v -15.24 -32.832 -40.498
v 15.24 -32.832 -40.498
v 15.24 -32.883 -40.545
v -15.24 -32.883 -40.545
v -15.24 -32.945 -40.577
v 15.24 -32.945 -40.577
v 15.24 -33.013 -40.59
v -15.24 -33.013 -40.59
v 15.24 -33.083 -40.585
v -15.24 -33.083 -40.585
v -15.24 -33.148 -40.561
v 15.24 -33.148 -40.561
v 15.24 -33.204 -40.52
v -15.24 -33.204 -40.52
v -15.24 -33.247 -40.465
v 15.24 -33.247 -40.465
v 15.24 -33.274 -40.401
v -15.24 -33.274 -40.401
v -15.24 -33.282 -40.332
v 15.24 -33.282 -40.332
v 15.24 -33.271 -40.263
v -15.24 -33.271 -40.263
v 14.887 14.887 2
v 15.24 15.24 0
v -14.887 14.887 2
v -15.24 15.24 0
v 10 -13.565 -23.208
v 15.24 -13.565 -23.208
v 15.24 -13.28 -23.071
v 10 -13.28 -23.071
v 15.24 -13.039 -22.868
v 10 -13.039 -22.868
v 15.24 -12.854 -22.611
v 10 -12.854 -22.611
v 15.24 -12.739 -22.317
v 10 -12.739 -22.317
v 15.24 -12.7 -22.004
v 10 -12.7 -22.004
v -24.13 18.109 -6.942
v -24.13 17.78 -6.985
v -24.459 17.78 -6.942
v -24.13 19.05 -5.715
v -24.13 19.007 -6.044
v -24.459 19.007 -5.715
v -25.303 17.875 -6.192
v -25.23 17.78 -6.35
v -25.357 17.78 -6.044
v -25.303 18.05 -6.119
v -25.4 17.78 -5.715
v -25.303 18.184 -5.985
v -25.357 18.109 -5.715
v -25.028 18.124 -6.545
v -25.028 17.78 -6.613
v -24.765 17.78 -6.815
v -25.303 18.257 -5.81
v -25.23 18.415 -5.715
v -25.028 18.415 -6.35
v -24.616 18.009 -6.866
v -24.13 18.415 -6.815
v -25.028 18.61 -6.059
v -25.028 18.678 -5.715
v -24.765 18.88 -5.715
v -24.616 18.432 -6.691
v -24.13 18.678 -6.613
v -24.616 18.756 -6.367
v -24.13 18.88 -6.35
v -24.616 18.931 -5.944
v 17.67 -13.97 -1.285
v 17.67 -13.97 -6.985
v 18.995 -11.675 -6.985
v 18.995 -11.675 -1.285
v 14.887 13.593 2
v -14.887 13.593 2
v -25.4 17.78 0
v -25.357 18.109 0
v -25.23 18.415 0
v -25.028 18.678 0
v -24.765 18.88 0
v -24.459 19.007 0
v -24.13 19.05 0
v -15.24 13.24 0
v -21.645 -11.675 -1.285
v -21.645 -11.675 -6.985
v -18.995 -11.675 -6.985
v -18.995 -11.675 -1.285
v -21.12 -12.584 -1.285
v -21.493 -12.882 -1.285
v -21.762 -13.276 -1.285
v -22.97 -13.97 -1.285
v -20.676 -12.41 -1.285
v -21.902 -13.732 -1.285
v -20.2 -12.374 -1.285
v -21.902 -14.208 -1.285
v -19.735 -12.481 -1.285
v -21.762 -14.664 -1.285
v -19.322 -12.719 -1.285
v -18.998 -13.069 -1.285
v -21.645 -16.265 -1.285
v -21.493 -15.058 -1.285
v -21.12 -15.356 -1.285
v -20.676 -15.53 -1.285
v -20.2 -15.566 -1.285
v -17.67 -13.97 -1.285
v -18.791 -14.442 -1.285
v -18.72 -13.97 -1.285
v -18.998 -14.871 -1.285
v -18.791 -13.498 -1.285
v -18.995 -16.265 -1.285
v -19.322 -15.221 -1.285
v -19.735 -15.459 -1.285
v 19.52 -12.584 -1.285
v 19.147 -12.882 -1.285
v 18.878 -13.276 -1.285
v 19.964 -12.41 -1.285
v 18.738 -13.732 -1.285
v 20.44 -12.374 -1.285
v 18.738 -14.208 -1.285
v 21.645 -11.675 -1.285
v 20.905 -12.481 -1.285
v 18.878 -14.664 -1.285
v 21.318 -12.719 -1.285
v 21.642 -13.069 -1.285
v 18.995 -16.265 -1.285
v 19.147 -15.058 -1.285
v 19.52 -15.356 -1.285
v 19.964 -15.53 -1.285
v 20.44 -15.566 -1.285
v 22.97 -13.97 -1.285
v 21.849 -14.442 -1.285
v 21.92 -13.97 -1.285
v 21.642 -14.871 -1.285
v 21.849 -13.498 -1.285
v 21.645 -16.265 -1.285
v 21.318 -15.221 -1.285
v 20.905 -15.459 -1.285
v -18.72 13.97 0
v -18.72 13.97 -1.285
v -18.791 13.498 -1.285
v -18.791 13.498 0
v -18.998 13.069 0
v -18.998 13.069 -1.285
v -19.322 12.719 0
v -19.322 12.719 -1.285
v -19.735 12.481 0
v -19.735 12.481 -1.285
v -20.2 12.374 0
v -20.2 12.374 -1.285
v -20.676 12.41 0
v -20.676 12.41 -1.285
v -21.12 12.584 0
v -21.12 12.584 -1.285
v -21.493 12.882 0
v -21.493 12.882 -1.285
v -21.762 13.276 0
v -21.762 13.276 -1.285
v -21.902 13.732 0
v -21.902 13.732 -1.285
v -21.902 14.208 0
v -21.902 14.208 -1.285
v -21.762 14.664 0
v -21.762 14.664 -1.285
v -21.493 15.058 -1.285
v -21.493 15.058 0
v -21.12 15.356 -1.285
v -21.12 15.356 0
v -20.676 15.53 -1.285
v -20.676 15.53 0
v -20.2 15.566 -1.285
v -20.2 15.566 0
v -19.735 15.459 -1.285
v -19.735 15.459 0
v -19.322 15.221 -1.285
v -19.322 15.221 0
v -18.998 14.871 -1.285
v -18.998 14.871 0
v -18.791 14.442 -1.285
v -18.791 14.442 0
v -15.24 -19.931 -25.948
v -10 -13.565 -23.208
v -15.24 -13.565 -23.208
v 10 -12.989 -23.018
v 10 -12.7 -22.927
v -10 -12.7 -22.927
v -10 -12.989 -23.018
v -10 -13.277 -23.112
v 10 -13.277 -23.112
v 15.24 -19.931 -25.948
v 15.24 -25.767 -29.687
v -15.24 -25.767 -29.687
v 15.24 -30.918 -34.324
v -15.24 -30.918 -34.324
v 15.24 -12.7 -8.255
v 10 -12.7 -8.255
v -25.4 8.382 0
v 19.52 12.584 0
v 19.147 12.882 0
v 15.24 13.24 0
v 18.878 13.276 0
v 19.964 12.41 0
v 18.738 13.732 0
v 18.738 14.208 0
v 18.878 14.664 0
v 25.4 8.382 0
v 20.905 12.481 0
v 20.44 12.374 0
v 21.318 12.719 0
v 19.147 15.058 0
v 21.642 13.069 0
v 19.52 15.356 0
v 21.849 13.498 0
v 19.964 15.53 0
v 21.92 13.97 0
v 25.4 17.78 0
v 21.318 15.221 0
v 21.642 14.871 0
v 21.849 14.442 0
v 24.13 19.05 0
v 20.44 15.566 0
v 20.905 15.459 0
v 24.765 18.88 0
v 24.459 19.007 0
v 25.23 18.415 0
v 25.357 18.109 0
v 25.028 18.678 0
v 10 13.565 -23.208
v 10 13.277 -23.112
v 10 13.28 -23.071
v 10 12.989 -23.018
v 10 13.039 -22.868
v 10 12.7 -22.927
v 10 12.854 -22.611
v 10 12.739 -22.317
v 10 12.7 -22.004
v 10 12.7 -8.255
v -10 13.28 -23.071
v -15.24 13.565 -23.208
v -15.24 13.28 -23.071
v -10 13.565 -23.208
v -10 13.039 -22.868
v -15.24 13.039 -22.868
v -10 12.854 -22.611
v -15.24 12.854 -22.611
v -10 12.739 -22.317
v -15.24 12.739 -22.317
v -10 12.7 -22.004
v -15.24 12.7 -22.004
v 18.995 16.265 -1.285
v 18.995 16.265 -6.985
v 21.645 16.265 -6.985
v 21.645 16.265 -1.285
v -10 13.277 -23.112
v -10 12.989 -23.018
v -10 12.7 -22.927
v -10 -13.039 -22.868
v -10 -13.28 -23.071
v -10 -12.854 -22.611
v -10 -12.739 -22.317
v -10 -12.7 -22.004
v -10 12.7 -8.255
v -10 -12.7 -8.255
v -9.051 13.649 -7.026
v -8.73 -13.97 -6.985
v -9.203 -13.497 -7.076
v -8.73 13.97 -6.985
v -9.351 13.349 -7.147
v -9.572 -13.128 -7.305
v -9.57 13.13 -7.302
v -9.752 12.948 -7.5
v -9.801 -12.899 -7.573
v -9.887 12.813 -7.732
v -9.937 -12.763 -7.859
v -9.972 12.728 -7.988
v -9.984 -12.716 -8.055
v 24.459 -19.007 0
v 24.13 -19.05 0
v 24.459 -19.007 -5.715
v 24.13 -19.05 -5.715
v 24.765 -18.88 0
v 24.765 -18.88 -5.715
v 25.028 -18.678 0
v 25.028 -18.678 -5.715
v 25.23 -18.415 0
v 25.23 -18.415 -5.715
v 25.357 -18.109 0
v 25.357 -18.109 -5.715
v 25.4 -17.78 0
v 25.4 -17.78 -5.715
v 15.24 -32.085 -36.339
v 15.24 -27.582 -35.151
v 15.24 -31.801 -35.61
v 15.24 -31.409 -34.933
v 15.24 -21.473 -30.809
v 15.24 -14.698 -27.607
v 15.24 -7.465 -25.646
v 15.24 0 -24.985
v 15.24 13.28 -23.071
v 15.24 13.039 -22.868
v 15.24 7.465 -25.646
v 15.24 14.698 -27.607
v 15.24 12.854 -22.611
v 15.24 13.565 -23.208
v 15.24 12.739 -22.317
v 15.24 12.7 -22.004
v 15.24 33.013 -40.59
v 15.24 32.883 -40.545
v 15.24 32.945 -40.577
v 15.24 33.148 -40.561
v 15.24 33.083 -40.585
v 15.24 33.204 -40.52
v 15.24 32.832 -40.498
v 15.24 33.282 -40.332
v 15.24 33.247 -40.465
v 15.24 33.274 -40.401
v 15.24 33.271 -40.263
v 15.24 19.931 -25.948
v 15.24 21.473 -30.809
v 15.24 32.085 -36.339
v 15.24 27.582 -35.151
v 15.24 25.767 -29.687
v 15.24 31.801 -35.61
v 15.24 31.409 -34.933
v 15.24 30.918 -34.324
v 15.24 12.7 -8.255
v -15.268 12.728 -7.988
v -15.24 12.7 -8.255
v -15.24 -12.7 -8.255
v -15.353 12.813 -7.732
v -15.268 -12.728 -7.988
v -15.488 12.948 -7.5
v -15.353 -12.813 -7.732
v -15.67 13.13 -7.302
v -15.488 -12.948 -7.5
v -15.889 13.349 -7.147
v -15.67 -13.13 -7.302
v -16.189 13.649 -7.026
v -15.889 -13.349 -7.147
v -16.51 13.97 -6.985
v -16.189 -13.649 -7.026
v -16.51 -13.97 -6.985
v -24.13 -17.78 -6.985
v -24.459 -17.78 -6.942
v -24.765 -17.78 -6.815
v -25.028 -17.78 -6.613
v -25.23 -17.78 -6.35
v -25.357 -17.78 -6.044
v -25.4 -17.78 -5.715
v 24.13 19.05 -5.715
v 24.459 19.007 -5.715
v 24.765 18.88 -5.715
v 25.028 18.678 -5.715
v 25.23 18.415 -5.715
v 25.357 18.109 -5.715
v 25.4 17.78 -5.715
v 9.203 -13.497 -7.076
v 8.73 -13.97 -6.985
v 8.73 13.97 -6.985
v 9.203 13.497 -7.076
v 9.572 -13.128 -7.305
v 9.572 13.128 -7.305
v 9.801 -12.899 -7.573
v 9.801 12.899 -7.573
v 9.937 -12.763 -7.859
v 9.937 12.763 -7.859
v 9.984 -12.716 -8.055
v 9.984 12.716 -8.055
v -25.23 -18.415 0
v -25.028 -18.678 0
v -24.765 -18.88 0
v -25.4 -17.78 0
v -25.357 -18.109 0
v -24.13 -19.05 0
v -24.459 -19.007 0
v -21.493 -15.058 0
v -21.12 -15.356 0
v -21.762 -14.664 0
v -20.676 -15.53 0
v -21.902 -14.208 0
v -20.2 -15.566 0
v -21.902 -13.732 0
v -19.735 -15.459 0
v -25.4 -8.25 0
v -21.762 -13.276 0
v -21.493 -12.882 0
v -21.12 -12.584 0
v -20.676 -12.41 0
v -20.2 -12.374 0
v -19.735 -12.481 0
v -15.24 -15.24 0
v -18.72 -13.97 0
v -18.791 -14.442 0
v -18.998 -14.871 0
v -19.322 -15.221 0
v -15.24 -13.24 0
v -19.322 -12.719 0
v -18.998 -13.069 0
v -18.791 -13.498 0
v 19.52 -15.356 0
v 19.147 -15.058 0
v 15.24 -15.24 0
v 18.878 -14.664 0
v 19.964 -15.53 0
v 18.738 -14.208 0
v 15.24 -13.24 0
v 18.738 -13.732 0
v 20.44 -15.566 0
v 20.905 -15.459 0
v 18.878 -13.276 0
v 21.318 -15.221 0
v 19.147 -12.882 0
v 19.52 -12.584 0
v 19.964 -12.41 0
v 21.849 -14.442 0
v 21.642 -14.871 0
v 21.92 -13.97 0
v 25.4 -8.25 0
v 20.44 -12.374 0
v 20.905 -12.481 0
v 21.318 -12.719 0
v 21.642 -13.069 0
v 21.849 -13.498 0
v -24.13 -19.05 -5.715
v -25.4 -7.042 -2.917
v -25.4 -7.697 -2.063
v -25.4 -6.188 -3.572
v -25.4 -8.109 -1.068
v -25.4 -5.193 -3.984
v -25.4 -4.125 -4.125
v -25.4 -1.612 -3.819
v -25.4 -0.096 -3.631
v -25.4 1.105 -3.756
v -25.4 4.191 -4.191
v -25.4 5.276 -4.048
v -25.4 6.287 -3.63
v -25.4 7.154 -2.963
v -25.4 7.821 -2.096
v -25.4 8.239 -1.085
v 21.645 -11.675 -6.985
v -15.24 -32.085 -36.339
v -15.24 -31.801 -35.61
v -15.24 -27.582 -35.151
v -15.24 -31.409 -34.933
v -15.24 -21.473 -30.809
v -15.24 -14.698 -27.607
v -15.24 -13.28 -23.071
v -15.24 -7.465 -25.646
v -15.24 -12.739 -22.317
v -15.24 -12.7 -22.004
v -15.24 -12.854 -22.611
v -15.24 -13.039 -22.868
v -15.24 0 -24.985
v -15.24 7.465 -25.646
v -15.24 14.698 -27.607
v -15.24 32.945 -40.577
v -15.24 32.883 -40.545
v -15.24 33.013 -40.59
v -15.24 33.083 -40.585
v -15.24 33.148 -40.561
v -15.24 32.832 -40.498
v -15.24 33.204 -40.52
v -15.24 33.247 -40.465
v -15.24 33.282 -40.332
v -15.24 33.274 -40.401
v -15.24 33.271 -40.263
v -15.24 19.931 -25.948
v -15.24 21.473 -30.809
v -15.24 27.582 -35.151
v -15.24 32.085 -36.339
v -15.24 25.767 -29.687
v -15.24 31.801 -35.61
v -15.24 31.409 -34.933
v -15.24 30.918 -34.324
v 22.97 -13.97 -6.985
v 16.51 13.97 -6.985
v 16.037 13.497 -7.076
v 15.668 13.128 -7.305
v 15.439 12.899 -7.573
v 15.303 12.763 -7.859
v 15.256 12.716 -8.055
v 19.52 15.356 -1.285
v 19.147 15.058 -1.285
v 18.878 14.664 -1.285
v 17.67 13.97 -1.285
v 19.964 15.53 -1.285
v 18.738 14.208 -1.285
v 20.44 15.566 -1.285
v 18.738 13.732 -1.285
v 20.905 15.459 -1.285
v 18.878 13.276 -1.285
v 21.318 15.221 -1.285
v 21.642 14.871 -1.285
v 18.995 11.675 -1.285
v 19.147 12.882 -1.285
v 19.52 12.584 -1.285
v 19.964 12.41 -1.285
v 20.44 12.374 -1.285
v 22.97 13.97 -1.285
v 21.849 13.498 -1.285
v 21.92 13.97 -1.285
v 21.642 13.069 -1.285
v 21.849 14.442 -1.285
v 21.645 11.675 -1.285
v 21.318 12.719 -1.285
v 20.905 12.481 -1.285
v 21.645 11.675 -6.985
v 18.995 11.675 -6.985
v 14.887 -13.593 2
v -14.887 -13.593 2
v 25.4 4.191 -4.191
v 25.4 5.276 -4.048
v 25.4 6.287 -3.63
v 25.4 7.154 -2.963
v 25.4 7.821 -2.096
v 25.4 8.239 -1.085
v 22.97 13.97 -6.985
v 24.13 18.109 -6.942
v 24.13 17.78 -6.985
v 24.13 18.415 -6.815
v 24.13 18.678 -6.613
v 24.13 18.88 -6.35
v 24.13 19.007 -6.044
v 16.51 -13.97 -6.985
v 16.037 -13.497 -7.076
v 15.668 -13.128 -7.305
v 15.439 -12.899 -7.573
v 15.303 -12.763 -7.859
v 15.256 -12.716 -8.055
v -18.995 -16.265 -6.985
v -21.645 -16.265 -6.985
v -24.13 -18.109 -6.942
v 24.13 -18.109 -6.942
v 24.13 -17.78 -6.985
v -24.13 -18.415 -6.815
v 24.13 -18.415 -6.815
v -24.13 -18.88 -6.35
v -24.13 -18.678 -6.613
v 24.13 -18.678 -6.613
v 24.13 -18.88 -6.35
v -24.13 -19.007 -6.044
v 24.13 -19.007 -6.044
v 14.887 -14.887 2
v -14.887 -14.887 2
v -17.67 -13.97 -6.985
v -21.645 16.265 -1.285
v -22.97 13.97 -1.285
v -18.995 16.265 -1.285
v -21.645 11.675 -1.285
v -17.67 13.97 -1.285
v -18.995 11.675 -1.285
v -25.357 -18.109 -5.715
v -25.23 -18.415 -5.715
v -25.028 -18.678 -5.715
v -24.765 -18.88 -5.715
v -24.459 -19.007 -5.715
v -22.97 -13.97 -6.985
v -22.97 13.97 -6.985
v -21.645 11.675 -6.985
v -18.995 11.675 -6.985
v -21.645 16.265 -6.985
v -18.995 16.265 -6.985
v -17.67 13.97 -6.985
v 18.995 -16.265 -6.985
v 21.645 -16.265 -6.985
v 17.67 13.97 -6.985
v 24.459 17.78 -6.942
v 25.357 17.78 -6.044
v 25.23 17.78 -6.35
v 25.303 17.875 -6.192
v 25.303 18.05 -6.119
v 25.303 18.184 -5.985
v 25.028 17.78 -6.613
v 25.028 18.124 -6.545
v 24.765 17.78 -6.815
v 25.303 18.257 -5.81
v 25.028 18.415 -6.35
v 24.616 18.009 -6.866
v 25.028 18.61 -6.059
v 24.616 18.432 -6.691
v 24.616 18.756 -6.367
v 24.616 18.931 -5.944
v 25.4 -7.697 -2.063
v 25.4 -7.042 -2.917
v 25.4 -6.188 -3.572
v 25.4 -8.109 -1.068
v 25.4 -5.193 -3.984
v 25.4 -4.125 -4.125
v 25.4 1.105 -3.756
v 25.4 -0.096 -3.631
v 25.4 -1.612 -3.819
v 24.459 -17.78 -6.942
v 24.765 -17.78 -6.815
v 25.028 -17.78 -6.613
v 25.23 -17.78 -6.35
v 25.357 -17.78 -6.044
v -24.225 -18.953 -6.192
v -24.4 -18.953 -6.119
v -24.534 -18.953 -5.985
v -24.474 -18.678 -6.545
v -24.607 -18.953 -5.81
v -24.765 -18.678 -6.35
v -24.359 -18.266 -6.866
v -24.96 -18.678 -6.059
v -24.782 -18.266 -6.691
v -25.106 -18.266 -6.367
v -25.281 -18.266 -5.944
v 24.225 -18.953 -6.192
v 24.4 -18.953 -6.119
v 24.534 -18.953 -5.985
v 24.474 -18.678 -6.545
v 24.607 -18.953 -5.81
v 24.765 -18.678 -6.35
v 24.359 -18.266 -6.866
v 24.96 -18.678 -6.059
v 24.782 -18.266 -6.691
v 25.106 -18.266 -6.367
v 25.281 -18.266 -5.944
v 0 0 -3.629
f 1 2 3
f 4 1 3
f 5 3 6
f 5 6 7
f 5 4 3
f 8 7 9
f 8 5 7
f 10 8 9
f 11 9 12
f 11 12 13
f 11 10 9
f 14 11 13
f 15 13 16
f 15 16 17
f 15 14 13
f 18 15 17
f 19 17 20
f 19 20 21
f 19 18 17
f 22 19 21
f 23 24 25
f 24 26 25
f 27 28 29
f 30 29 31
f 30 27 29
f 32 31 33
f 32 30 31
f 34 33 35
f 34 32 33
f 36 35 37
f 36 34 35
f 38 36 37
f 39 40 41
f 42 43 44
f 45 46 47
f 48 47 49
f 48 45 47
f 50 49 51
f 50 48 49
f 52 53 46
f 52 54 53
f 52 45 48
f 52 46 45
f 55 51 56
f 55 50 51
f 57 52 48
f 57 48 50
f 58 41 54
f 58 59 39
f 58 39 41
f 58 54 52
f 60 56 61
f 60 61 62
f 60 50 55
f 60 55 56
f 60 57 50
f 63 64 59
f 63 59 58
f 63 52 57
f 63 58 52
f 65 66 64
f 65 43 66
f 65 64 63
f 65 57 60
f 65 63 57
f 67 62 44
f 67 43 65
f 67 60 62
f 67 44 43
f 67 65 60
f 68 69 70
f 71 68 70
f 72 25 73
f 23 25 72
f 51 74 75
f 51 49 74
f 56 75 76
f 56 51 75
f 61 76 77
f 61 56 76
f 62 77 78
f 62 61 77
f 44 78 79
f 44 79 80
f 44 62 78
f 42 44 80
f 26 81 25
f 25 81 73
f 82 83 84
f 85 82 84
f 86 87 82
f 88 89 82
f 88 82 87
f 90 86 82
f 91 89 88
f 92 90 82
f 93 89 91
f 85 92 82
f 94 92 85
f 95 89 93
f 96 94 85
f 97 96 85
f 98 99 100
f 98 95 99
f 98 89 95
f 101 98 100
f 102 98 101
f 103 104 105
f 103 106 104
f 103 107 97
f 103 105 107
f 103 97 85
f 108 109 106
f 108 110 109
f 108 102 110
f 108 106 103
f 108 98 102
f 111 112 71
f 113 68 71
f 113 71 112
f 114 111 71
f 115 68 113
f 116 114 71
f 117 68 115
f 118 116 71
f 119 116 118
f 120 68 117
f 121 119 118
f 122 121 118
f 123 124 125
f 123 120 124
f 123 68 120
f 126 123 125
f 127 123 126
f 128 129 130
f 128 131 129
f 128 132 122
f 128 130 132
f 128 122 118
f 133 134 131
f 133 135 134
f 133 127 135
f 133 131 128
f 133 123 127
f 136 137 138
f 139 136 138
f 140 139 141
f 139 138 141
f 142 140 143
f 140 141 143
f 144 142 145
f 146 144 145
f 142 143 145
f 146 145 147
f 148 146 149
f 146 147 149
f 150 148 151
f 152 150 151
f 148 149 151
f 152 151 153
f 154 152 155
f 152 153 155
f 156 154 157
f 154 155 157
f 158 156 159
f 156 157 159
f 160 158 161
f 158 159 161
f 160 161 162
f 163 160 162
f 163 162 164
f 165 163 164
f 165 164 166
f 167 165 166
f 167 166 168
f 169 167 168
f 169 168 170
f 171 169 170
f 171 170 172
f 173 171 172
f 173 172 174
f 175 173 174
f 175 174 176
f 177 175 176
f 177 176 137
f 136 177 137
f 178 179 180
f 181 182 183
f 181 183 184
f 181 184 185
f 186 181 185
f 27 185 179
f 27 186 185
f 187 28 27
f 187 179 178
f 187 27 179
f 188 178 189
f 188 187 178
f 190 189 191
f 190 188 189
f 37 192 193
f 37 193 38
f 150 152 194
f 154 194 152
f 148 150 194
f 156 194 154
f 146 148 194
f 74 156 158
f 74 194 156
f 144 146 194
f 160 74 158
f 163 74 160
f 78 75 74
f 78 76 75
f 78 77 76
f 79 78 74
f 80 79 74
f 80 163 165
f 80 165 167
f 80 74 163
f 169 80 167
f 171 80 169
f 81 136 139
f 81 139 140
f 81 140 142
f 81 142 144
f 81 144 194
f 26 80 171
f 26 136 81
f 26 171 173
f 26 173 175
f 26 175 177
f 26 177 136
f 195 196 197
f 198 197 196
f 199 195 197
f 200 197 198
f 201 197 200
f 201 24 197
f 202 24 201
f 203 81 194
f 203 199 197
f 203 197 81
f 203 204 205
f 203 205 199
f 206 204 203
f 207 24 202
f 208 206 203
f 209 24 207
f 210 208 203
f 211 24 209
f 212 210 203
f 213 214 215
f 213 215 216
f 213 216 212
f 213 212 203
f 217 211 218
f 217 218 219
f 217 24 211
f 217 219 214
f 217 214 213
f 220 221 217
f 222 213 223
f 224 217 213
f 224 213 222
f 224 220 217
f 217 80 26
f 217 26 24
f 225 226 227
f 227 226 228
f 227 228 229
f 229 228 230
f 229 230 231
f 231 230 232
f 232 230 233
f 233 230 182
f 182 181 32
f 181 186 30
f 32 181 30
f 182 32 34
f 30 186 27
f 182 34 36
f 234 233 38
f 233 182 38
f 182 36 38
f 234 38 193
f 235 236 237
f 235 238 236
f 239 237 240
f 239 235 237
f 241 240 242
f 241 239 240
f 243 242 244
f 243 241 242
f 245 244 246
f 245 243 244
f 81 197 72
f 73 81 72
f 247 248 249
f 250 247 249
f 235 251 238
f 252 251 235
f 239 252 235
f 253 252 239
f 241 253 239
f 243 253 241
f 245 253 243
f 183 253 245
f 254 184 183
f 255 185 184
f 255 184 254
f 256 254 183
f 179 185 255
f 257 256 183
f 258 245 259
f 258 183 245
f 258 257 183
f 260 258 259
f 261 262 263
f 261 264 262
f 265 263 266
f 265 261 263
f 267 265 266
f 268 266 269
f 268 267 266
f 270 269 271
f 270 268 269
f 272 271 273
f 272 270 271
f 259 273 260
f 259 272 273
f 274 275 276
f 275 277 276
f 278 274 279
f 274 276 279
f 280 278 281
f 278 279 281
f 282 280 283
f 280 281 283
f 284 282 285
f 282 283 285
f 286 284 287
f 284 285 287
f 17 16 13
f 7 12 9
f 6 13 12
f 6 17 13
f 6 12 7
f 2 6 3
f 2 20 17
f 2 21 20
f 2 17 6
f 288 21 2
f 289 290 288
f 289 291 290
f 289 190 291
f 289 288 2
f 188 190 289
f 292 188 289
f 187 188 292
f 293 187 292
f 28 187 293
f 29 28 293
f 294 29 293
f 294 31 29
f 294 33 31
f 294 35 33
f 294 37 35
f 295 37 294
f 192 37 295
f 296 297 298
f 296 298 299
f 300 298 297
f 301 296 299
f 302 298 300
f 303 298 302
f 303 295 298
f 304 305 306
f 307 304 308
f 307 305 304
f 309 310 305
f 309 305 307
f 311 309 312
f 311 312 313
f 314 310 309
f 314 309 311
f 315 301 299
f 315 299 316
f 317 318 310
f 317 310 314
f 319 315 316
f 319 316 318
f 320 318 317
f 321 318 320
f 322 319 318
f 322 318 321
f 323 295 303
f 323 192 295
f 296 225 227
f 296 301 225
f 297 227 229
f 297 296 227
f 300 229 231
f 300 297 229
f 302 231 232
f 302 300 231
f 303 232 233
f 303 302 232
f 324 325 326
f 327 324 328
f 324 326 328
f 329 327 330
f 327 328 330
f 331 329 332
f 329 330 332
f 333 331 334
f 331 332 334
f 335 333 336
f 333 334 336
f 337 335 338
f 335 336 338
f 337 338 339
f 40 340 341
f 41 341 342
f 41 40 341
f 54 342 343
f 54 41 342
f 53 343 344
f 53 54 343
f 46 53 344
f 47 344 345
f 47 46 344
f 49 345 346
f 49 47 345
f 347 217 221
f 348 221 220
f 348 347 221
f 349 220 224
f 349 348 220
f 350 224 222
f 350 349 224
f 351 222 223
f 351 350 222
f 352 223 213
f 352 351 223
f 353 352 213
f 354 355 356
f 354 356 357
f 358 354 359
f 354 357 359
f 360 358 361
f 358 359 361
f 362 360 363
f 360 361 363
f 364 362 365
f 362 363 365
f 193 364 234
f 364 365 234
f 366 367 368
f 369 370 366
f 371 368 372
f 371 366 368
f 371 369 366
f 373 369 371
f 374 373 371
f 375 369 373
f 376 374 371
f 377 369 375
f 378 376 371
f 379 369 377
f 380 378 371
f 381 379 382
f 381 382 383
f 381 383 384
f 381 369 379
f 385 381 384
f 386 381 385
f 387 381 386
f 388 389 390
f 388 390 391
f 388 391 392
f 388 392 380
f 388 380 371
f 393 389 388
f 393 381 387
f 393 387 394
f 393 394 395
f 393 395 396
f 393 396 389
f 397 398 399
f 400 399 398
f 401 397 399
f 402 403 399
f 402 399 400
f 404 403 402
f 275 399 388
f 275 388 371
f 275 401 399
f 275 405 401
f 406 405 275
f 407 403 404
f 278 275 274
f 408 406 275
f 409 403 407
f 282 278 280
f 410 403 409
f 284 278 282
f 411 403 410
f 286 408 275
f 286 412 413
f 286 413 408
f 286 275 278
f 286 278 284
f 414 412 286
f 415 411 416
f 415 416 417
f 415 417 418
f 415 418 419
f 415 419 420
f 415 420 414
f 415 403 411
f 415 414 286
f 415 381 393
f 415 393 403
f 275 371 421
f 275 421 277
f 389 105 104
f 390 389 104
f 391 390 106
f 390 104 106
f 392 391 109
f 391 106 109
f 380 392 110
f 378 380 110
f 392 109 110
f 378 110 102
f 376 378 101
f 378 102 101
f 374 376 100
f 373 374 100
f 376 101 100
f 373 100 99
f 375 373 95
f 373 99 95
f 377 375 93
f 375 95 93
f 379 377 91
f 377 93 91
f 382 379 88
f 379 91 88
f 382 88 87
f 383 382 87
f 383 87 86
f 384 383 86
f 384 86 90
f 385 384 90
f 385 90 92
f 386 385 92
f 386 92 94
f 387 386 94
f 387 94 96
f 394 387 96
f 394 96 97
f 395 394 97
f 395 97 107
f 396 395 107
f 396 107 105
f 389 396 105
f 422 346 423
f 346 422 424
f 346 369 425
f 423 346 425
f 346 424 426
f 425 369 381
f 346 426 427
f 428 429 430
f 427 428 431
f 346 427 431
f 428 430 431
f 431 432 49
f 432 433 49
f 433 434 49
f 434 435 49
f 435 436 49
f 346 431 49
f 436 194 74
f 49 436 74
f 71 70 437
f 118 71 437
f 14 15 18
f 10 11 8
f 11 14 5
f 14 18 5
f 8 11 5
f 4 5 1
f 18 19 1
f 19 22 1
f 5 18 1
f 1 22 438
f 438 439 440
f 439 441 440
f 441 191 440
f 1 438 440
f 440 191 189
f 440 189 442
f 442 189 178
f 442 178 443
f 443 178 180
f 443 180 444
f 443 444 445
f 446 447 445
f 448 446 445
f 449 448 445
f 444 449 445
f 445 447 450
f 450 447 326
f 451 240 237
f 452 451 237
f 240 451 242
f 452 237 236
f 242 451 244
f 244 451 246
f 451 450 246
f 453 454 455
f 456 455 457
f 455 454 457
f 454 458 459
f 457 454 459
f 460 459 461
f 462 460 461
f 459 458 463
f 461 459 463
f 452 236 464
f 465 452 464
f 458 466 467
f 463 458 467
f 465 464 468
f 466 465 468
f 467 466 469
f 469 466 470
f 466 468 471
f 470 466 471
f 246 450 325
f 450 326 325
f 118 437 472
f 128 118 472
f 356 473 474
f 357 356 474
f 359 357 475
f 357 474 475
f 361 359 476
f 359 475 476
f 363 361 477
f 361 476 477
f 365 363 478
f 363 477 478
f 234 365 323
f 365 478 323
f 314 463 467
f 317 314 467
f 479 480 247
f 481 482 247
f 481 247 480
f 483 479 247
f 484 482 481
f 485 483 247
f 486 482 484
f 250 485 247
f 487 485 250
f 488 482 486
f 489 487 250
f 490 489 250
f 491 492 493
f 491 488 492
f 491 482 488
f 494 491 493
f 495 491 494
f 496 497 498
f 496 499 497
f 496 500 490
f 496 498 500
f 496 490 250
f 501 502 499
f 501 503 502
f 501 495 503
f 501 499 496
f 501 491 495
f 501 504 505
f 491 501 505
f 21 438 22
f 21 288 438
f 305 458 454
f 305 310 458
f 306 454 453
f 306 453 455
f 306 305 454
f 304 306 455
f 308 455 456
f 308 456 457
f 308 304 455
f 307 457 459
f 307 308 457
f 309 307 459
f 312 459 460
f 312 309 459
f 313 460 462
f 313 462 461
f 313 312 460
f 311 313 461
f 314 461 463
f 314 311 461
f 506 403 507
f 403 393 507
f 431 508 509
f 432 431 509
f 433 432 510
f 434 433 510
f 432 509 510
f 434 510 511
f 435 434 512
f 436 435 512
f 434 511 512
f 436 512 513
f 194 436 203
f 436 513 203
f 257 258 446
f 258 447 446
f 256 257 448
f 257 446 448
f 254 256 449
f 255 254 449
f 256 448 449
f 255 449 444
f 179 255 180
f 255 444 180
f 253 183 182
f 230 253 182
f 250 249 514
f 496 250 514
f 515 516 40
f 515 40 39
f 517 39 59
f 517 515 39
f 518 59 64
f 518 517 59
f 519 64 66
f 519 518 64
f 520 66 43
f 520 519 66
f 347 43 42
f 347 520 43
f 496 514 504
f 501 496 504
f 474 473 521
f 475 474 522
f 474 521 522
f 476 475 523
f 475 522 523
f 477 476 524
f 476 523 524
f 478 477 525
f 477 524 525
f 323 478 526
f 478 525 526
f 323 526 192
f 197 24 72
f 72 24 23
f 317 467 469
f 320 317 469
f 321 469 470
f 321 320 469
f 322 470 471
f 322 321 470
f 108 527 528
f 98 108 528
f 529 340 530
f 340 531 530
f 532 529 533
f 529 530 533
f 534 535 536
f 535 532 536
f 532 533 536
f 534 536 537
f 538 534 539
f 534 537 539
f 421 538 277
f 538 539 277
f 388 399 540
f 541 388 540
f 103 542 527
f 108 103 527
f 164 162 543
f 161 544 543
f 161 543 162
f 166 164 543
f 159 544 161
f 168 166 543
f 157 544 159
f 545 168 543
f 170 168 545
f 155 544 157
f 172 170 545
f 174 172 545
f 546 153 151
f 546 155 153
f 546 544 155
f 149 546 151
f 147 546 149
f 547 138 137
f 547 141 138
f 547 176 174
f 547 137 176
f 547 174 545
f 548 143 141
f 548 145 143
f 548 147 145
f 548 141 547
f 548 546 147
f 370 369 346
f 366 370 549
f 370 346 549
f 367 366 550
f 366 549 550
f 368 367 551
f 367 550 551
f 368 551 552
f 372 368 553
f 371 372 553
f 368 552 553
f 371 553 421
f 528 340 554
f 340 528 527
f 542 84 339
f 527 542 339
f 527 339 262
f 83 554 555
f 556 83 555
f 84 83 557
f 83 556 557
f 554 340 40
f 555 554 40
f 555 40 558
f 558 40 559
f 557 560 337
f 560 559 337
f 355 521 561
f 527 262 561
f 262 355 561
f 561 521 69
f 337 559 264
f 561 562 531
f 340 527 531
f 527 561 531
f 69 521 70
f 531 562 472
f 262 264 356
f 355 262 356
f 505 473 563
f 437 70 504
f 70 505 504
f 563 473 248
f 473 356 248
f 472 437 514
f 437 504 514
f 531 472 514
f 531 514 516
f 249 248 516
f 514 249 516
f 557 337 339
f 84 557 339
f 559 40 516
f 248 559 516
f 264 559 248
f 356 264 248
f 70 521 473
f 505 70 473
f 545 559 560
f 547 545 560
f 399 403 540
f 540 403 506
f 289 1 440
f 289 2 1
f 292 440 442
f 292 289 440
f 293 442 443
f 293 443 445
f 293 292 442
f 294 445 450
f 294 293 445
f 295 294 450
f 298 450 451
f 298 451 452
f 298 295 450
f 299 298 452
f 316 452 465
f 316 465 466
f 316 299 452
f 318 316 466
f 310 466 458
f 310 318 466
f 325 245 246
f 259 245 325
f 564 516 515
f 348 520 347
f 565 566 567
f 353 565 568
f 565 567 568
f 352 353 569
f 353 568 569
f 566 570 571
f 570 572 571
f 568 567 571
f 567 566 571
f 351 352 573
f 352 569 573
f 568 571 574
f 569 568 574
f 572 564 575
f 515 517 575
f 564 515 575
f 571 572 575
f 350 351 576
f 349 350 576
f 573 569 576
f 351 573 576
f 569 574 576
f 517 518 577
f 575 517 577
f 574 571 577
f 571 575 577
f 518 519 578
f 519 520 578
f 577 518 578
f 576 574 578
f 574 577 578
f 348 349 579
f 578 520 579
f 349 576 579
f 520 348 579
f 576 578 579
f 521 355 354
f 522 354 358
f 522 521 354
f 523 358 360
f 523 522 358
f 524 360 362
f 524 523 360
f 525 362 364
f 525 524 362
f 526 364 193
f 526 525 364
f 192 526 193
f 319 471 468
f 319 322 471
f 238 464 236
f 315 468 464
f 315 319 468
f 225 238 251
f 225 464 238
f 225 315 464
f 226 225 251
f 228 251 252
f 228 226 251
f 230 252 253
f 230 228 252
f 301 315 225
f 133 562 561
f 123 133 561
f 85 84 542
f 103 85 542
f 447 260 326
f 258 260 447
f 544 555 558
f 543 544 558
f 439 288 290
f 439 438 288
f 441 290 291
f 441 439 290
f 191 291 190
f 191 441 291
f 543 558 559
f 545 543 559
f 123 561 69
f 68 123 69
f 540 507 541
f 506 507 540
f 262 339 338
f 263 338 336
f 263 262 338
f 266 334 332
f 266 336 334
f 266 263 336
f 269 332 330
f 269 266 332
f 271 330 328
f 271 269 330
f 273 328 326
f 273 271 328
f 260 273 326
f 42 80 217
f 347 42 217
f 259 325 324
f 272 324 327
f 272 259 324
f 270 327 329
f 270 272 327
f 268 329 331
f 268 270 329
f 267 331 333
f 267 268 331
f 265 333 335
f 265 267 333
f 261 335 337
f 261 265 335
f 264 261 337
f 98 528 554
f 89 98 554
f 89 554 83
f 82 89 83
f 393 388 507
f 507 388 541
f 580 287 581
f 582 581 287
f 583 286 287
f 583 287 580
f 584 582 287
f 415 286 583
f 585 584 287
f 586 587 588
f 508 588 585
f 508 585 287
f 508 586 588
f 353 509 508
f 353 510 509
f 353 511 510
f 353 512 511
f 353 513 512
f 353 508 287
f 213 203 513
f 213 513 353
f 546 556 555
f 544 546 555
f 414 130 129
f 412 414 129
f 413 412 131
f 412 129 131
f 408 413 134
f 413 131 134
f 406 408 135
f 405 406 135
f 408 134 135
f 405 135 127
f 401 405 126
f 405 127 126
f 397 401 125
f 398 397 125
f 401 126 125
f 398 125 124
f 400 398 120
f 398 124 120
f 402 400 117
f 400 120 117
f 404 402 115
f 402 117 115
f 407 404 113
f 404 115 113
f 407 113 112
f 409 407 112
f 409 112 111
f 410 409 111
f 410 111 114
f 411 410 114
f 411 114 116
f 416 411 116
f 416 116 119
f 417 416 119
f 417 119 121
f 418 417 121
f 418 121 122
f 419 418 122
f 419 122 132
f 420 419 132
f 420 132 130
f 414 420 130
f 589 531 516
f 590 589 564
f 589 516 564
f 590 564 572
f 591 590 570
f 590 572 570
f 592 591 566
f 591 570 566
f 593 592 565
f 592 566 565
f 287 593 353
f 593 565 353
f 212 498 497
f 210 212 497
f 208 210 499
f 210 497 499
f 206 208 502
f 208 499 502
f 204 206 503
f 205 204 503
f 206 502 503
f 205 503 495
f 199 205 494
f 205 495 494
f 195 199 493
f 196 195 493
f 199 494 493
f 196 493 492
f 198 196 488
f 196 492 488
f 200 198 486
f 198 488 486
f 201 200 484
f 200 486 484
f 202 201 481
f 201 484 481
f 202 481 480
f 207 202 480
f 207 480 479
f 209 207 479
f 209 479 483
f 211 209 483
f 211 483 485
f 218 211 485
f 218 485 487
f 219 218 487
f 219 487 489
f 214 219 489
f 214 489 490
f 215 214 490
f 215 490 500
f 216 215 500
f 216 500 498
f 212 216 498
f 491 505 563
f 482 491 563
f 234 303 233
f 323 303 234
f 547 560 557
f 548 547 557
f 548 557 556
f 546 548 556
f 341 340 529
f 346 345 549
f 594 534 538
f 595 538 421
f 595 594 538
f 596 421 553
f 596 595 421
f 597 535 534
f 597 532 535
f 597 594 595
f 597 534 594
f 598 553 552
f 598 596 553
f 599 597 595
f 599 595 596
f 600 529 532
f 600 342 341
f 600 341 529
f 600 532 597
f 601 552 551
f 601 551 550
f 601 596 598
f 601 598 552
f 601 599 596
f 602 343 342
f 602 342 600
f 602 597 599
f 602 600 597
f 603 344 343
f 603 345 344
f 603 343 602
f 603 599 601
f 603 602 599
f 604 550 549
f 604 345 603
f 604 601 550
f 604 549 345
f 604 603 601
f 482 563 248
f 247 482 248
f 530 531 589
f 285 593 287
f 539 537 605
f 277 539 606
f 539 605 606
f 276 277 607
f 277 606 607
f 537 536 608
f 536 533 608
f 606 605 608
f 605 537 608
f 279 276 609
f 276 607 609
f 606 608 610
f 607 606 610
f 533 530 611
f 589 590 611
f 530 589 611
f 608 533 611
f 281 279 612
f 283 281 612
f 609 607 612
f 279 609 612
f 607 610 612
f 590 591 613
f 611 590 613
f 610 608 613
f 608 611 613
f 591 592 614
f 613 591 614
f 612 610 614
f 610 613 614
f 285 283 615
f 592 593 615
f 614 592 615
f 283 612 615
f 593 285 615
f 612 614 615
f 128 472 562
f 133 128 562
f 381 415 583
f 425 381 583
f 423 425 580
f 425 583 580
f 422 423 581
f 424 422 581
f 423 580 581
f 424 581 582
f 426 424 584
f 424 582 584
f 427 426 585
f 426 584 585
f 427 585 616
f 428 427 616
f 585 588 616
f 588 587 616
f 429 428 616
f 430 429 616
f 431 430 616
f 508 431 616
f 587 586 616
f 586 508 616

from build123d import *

# Parameters (mm, degrees)
F1_W          = 50.8
F1_H          = 38.1
F2_DEPTH      = 6.985
F4_DEPTH      = 50.8
F6_DEPTH      = 15.24
F6_DEPTH_BACK = 15.24
F7_W          = 20
F7_H          = 15.9418935353
F8_DEPTH      = 25.4
F9_R          = 1.6
F10_DEPTH     = 25.4
F11_R         = 1.6
F12_DEPTH     = 5.7
F13_W         = 30.48
F13_H         = 2
F14_DEPTH     = 2
F14_TAPER     = 10
F15_F1_R      = 0.254
F15_F2_R      = 0.254
F16_R         = 5.08
F17_R         = 1.27


# Not quite as in the source:
# - two fillets or chamfers of one size are made in one step


with BuildPart() as f2:
    # F1 (on Top) → F2 (new body)
    with BuildSketch(Plane.XY):
        Rectangle(F1_W, F1_H)
    extrude(amount=-F2_DEPTH)

    # F3 (on face) → F4 (cut, through all)
    with BuildSketch(Plane.YZ.offset(25.4)):
        with BuildLine():
            add(Edge.make_bspline(
                [(-4.125, 4.125), (-2.4255892558, 4.1137489608), (-0.0276085061, 2.971292738), (2.5249406681, 4.1137612248), (4.191, 4.191)],
                knots=[0, 0, 0, 0, 0.4977710734, 1, 1, 1, 1], degree=3))
            ThreePointArc((-4.125, 4.125), (-7.0418154724, 2.9168154724), (-8.25, 0))
            ThreePointArc((-8.25, 0), (-7.0418154724, -2.9168154724), (-4.125, -4.125))
            add(Edge.make_bspline(
                [(-4.125, -4.125), (-2.9335741419, -4.2006121948), (0.4172014685, -3.0581585459), (2.1438994445, -4.2006121948), (4.191, -4.191)],
                knots=[0, 0, 0, 0, 0.497799261, 1, 1, 1, 1], degree=3))
            ThreePointArc((4.191, -4.191), (7.15448452, -2.96348452), (8.382, 0))
            ThreePointArc((8.382, 0), (7.15448452, 2.96348452), (4.191, 4.191))
        make_face()
    extrude(amount=-F4_DEPTH, mode=Mode.SUBTRACT)

    # F5 (on Right) → F6 (join, two sides)
    with BuildSketch(Plane.YZ) as f6_sk:
        with BuildLine():
            ThreePointArc((-33.655, -41.5313687512), (0, -24.985), (33.655, -41.5313687512))
            Line((33.655, -41.5313687512), (31.75, -35.2327876972))
            ThreePointArc((31.75, -35.2327876972), (23.0609926669, -27.7856916423), (12.7, -22.9268935353))
            ThreePointArc((12.7, -22.9268935353), (0, -20.985), (-12.7, -22.9268935353))
            ThreePointArc((-12.7, -22.9268935353), (-23.0609926669, -27.7856916423), (-31.75, -35.2327876972))
            Line((-31.75, -35.2327876972), (-33.655, -41.5313687512))
        make_face()
        with BuildLine():
            ThreePointArc((-12.7, -22.9268935353), (0, -20.985), (12.7, -22.9268935353))
            Line((12.7, -22.9268935353), (12.7, -6.985))
            Line((12.7, -6.985), (-12.7, -6.985))
            Line((-12.7, -6.985), (-12.7, -22.9268935353))
        make_face()
    extrude(amount=F6_DEPTH)
    extrude(f6_sk.sketch, amount=-F6_DEPTH_BACK)

    # F7 (on face) → F8 (cut)
    with BuildSketch(Plane.XZ.offset(12.7)):
        with Locations((0, -14.9559467677)):
            Rectangle(F7_W, F7_H)
    extrude(amount=-F8_DEPTH, mode=Mode.SUBTRACT)

    # F9 (on face) → F10 (cut)
    with BuildSketch(Plane(origin=(0, 0, -6.985), x_dir=(1, 0, 0), z_dir=(0, 0, -1))):
        with Locations((20.32, -13.97)):
            Circle(F9_R)
        with Locations((-20.32, -13.97)):
            Circle(F9_R)
        with Locations((-20.32, 13.97)):
            Circle(F9_R)
        with Locations((20.32, 13.97)):
            Circle(F9_R)
    extrude(amount=-F10_DEPTH, mode=Mode.SUBTRACT)

    # F11 (on face) → F12 (cut)
    with BuildSketch(Plane(origin=(0, 0, -6.985), x_dir=(1, 0, 0), z_dir=(0, 0, -1))):
        Polygon((21.645, -16.26496732), (22.97, -13.97), (21.645, -11.67503268), (18.995, -11.67503268), (17.67, -13.97), (18.995, -16.26496732), align=None)
        with Locations((20.32, -13.97)):
            Circle(F11_R, mode=Mode.SUBTRACT)
        Polygon((-18.995, -11.67503268), (-21.645, -11.67503268), (-22.97, -13.97), (-21.645, -16.26496732), (-18.995, -16.26496732), (-17.67, -13.97), align=None)
        with Locations((-20.32, -13.97)):
            Circle(F11_R, mode=Mode.SUBTRACT)
        Polygon((-18.995, 11.67503268), (-17.67, 13.97), (-18.995, 16.26496732), (-21.645, 16.26496732), (-22.97, 13.97), (-21.645, 11.67503268), align=None)
        with Locations((-20.32, 13.97)):
            Circle(F11_R, mode=Mode.SUBTRACT)
        Polygon((18.995, 11.67503268), (21.645, 11.67503268), (22.97, 13.97), (21.645, 16.26496732), (18.995, 16.26496732), (17.67, 13.97), align=None)
        with Locations((20.32, 13.97)):
            Circle(F11_R, mode=Mode.SUBTRACT)
    extrude(amount=-F12_DEPTH, mode=Mode.SUBTRACT)

    # F13 (on face) → F14 (join)
    with BuildSketch(Plane.XY):
        with Locations((0, 14.24)):
            Rectangle(F13_W, F13_H)
        with Locations((0, -14.24)):
            Rectangle(F13_W, F13_H)
    extrude(amount=F14_DEPTH, taper=F14_TAPER)

    # F15: fillet of radius 0.254 on 2 edges, made by hand

    # F15_f1
    f15_f1_edges = [f2.edges().sort_by_distance(p)[0] for p in [
        (0, -33.655, -41.5313687512),
    ]]
    fillet(f15_f1_edges, radius=F15_F1_R)

    # F15_f2
    f15_f2_edges = [f2.edges().sort_by_distance(p)[0] for p in [
        (0, 33.655, -41.5313687512),
    ]]
    fillet(f15_f2_edges, radius=F15_F2_R)

    # F16
    f16_edges = [f2.edges().sort_by_distance(p)[0] for p in [
        (0, 31.75, -35.232788),
        (0, -31.75, -35.232788),
    ]]
    fillet(f16_edges, radius=F16_R)

    # F17
    f17_edges = [f2.edges().sort_by_distance(p)[0] for p in [
        (-15.24, 0, -6.985),
        (12.62, 12.7, -22.926894),
        (-12.62, 12.7, -22.926894),
        (-12.62, 12.7, -6.985),
        (0, 19.05, -6.985),
        (25.4, 0, -6.985),
        (-25.4, 0, -6.985),
        (0, -19.05, -6.985),
        (-12.62, -12.7, -6.985),
        (-10, 0, -6.985),
        (12.62, -12.7, -6.985),
        (15.24, 0, -6.985),
        (10, 0, -6.985),
        (12.62, 12.7, -6.985),
        (-12.62, -12.7, -22.926894),
        (12.62, -12.7, -22.926894),
        (25.4, 19.05, -3.4925),
        (-25.4, 19.05, -3.4925),
        (25.4, -19.05, -3.4925),
        (-25.4, -19.05, -3.4925),
    ]]
    fillet(f17_edges, radius=F17_R)


solid = f2.part
